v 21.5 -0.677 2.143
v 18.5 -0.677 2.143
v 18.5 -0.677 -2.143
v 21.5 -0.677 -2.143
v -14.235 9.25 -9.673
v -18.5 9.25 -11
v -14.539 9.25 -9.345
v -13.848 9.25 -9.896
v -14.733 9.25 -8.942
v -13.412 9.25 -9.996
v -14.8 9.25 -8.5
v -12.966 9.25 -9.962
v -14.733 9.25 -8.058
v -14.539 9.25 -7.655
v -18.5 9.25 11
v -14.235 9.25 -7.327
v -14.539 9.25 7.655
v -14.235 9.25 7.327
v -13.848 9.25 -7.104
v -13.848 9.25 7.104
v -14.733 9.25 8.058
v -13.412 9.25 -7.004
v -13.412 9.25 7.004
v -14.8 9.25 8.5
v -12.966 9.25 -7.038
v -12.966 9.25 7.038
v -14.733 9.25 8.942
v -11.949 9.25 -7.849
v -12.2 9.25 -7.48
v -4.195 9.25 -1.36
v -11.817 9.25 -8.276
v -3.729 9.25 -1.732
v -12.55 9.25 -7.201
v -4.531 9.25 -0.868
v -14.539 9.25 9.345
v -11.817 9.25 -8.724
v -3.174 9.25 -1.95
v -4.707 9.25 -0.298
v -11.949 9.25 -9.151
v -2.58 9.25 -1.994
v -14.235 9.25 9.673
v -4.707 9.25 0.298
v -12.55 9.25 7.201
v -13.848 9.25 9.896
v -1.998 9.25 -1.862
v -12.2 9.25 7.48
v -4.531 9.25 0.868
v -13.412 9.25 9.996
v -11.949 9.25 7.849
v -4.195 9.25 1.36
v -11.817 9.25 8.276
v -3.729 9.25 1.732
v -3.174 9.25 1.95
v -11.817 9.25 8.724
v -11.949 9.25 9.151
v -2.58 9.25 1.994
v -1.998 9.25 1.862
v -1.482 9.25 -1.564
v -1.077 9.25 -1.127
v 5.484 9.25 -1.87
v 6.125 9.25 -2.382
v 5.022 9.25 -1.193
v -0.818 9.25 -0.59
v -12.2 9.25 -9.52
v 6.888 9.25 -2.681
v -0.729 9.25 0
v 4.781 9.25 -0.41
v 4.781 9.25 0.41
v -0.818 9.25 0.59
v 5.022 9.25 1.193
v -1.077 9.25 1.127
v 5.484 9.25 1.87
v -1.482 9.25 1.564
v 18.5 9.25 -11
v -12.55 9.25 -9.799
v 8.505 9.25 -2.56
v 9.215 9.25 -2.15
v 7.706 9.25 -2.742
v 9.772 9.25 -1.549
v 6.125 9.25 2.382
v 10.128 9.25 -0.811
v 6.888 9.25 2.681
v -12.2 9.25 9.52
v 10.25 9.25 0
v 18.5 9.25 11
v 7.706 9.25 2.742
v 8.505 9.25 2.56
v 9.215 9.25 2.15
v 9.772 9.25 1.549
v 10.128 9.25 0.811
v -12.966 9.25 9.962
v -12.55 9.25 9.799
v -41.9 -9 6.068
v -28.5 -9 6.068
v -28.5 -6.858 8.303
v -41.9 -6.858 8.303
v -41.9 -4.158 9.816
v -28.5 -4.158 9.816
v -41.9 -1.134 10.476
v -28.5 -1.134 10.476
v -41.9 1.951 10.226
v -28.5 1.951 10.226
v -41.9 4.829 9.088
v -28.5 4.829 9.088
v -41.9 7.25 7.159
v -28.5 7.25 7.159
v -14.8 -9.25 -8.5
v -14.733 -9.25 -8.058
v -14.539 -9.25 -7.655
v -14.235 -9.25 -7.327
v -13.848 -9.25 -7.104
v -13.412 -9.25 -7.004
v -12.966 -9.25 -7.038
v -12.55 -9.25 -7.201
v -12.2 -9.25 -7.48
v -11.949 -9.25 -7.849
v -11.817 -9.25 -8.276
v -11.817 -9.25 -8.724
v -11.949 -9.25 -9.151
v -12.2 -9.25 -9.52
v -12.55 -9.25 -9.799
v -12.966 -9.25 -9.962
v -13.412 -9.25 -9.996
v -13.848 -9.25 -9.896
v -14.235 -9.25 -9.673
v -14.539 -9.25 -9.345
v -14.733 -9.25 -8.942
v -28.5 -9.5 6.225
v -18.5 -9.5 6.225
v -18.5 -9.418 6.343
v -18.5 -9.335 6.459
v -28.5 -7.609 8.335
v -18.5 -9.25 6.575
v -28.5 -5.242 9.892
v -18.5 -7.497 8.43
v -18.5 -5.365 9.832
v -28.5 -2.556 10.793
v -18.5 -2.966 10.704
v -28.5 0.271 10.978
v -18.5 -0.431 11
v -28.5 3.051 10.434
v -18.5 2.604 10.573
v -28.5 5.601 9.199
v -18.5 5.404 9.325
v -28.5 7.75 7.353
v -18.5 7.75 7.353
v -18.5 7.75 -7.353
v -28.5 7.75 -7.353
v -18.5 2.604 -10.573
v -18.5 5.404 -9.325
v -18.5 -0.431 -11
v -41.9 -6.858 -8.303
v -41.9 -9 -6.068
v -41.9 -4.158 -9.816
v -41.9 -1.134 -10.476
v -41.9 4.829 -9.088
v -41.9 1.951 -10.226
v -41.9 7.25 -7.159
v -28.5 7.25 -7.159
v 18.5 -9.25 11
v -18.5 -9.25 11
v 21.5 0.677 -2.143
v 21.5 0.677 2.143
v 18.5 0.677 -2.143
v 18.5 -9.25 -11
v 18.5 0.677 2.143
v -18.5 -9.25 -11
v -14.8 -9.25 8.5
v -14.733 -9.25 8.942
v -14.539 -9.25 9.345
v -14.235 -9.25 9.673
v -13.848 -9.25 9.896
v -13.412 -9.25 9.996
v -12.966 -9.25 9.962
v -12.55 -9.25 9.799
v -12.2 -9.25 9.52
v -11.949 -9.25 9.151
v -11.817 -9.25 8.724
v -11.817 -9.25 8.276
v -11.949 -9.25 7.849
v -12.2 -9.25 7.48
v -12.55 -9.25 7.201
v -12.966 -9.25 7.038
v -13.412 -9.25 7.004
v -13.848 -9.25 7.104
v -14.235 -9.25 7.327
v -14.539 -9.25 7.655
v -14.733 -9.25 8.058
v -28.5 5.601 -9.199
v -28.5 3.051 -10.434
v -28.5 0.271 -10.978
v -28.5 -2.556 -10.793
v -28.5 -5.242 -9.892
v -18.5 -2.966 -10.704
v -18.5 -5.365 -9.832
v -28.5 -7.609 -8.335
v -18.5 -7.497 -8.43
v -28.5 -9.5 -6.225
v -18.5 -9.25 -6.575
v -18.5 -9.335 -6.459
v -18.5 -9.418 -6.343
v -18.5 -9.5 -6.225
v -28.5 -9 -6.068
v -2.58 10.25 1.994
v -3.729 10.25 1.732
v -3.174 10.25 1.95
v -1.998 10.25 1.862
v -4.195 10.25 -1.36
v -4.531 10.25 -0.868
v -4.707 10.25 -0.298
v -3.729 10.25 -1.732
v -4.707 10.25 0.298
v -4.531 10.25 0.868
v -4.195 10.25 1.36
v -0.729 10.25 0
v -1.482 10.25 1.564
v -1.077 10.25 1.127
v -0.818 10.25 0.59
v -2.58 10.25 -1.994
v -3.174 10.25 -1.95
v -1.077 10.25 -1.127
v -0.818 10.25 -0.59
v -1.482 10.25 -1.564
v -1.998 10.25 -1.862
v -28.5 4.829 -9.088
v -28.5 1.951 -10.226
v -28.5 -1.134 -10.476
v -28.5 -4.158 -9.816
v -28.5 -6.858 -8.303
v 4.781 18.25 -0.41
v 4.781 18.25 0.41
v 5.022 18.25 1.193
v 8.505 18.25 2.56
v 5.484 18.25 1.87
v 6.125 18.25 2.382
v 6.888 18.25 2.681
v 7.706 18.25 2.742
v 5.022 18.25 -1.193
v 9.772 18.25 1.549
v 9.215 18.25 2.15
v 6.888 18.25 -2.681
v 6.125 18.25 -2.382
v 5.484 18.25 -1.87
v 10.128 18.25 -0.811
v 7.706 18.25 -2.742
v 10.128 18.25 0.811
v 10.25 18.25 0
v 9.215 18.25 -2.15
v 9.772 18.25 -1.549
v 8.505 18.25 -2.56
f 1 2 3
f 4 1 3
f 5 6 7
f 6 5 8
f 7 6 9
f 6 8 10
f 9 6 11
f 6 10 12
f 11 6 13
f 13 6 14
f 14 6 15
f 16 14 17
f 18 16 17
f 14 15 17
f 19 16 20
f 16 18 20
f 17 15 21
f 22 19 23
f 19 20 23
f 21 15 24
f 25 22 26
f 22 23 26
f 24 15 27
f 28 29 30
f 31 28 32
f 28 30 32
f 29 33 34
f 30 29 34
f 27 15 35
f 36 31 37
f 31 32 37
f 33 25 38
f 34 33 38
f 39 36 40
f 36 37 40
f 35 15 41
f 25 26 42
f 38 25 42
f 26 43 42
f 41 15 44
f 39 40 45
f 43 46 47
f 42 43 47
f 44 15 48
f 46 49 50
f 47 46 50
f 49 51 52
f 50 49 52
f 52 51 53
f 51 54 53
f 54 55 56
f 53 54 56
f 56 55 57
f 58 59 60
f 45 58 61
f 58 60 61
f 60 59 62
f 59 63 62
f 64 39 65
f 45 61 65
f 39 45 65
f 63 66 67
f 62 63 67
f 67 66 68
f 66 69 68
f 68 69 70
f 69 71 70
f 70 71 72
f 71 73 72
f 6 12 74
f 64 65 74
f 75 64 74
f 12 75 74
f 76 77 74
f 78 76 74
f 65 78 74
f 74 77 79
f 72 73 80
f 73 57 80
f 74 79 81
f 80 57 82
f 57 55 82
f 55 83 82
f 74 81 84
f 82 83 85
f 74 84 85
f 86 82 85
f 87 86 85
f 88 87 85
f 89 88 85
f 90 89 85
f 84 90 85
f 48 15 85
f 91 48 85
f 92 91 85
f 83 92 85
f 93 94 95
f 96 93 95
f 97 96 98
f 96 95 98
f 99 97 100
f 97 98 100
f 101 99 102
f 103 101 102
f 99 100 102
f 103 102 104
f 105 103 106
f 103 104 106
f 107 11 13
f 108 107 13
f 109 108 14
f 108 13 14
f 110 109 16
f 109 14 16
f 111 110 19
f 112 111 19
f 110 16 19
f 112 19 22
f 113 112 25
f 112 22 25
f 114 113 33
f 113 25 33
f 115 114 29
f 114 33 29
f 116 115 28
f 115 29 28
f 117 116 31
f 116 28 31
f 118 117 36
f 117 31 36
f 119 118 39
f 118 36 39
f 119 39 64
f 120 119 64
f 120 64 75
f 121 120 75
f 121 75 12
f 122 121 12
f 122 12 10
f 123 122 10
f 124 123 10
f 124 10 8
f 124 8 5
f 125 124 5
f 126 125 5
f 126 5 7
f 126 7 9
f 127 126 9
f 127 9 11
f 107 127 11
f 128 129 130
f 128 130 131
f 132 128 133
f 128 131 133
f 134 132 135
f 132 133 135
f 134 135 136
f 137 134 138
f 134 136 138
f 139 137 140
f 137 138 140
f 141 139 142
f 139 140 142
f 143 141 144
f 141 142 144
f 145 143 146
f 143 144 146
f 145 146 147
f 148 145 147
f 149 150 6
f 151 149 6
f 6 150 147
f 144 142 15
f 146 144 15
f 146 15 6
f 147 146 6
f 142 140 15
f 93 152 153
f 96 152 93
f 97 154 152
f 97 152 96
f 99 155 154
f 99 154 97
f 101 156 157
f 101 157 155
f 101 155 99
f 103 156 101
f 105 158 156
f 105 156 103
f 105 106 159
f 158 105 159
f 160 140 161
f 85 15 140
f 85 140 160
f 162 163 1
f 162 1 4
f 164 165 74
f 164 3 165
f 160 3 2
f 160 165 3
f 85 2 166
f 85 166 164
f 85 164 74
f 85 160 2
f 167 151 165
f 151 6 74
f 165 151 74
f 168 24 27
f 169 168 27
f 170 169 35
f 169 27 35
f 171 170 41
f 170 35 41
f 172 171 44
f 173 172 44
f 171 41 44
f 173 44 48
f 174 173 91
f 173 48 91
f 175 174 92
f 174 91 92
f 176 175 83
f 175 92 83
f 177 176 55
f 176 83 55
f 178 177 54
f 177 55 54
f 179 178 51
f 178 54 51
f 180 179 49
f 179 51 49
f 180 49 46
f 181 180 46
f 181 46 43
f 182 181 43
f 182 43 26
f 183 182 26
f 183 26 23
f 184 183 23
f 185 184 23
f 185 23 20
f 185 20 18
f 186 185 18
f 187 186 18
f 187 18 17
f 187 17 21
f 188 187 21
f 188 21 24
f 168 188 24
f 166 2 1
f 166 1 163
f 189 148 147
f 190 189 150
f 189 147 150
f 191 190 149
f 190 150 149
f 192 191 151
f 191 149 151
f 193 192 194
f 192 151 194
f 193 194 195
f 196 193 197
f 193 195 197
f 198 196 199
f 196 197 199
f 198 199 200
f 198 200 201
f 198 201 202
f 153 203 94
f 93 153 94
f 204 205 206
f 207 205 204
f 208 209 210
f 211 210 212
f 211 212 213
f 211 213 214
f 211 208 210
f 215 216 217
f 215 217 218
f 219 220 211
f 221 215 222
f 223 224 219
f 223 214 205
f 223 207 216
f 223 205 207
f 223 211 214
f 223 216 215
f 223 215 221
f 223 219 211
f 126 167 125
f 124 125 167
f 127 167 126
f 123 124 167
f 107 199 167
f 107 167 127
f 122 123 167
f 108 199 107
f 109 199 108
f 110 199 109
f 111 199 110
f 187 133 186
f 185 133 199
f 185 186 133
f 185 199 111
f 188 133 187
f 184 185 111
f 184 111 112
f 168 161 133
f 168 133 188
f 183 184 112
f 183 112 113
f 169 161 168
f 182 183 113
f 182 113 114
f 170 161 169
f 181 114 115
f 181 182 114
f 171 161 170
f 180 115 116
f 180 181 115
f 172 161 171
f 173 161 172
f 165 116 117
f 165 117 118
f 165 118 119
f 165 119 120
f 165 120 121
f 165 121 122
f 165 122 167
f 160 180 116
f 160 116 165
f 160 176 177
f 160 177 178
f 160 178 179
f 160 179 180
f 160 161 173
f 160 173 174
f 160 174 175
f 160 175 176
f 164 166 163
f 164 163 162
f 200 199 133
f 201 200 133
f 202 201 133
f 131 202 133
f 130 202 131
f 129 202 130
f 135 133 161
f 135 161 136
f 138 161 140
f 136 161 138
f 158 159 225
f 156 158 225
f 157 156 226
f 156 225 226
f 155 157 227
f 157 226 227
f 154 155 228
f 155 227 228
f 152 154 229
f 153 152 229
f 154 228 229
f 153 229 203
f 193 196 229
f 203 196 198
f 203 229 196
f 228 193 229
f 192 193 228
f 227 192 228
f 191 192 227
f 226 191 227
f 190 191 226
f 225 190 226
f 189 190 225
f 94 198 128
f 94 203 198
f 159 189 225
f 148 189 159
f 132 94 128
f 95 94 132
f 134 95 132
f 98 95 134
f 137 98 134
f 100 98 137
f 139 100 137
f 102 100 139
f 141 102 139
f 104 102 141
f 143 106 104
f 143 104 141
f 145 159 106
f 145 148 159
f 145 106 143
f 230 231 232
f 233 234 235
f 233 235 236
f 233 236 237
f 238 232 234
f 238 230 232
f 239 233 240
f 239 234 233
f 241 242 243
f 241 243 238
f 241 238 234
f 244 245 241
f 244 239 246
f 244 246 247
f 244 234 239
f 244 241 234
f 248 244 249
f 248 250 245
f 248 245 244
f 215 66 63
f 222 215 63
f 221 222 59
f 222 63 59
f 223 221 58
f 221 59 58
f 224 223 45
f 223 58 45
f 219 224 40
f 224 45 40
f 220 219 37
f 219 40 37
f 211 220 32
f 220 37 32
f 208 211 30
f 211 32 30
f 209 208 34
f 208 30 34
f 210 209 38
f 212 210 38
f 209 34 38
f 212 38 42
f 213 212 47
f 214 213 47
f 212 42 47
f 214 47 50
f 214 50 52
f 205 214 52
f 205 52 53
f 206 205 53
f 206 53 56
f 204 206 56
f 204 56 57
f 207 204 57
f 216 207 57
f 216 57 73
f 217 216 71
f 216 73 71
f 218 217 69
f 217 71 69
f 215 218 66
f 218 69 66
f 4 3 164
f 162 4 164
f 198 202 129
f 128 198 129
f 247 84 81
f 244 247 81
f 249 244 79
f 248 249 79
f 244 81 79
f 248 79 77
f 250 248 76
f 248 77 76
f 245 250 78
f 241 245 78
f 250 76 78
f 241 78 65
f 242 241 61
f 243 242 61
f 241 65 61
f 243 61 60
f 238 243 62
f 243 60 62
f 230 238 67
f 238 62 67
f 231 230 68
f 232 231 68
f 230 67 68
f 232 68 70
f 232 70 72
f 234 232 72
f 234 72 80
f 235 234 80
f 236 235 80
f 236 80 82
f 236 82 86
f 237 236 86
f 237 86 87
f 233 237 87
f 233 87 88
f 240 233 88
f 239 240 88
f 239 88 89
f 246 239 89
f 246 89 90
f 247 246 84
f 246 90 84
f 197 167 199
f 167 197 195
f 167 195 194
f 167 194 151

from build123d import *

# Parameters (mm, degrees)
SKETCH_1_W          = 37
SKETCH_1_H          = 18.5
EXTRUDE_1_DEPTH     = 11
EXTRUDE_2_DEPTH     = 10
EXTRUDE_3_DEPTH     = 13.4
SKETCH_4_W          = 4.285372044
SKETCH_4_H          = 1.354621624
EXTRUDE_4_DEPTH     = 3
SKETCH_5_R          = 2
EXTRUDE_5_DEPTH     = 1
SKETCH_6_R          = 1.5
CUT_EXTRUDE_1_DEPTH = 20
SKETCH_8_R          = 2.75
EXTRUDE_6_DEPTH     = 9


with BuildPart() as part:
    # 스케치1 → 보스-돌출1 (new, symmetric)
    with BuildSketch(Plane.XY):
        Rectangle(SKETCH_1_W, SKETCH_1_H)
    extrude(amount=EXTRUDE_1_DEPTH, both=True)

    # 스케치2 → 보스-돌출2 (add)
    with BuildSketch(Plane.ZY.offset(18.5)):
        with BuildLine():
            Line((-6.225208394, -9.5), (6.225208394, -9.5))
            ThreePointArc((6.225208394, -9.5), (10.976552571, -1.148838505), (7.353316024, 7.75))
            Line((7.353316024, 7.75), (-7.353316024, 7.75))
            ThreePointArc((-7.353316024, 7.75), (-10.976552571, -1.148838505), (-6.225208394, -9.5))
        make_face()
    extrude(amount=EXTRUDE_2_DEPTH)

    # 스케치3 → 보스-돌출3 (add)
    with BuildSketch(Plane.ZY.offset(28.5)):
        with BuildLine():
            Line((-6.068131559, -9), (6.068131559, -9))
            ThreePointArc((6.068131559, -9), (10.476417681, -1.134328554), (7.159068059, 7.25))
            Line((7.159068059, 7.25), (-7.159068059, 7.25))
            ThreePointArc((-7.159068059, 7.25), (-10.476417681, -1.134328554), (-6.068131559, -9))
        make_face()
    extrude(amount=EXTRUDE_3_DEPTH)

    # 스케치4 → 보스-돌출4 (add)
    with BuildSketch(Plane(origin=(18.5, 0, 0), x_dir=(0, 0, -1), z_dir=(1, 0, 0))):
        Rectangle(SKETCH_4_W, SKETCH_4_H)
    extrude(amount=EXTRUDE_4_DEPTH)

    # 스케치5 → 보스-돌출5 (add)
    with BuildSketch(Plane(origin=(0, 9.25, 0), x_dir=(1, 0, 0), z_dir=(0, 1, 0))):
        with Locations((-2.729015684, 0)):
            Circle(SKETCH_5_R)
    extrude(amount=EXTRUDE_5_DEPTH)

    # 스케치6 → 컷-돌출1 (cut)
    with BuildSketch(Plane(origin=(0, 9.25, 0), x_dir=(1, 0, 0), z_dir=(0, 1, 0))):
        with Locations(Location((-13.3, 8.5, 0), (0, 0, 180))):
            Circle(SKETCH_6_R)
        with Locations(Location((-13.3, -8.5, 0), (0, 0, 180))):
            Circle(SKETCH_6_R)
    extrude(amount=-CUT_EXTRUDE_1_DEPTH, mode=Mode.SUBTRACT)

    # 스케치8 → 보스-돌출6 (add)
    with BuildSketch(Plane(origin=(0, 9.25, 0), x_dir=(1, 0, 0), z_dir=(0, 1, 0))):
        with Locations((7.5, 0)):
            Circle(SKETCH_8_R)
    extrude(amount=EXTRUDE_6_DEPTH)


solid = part.part
